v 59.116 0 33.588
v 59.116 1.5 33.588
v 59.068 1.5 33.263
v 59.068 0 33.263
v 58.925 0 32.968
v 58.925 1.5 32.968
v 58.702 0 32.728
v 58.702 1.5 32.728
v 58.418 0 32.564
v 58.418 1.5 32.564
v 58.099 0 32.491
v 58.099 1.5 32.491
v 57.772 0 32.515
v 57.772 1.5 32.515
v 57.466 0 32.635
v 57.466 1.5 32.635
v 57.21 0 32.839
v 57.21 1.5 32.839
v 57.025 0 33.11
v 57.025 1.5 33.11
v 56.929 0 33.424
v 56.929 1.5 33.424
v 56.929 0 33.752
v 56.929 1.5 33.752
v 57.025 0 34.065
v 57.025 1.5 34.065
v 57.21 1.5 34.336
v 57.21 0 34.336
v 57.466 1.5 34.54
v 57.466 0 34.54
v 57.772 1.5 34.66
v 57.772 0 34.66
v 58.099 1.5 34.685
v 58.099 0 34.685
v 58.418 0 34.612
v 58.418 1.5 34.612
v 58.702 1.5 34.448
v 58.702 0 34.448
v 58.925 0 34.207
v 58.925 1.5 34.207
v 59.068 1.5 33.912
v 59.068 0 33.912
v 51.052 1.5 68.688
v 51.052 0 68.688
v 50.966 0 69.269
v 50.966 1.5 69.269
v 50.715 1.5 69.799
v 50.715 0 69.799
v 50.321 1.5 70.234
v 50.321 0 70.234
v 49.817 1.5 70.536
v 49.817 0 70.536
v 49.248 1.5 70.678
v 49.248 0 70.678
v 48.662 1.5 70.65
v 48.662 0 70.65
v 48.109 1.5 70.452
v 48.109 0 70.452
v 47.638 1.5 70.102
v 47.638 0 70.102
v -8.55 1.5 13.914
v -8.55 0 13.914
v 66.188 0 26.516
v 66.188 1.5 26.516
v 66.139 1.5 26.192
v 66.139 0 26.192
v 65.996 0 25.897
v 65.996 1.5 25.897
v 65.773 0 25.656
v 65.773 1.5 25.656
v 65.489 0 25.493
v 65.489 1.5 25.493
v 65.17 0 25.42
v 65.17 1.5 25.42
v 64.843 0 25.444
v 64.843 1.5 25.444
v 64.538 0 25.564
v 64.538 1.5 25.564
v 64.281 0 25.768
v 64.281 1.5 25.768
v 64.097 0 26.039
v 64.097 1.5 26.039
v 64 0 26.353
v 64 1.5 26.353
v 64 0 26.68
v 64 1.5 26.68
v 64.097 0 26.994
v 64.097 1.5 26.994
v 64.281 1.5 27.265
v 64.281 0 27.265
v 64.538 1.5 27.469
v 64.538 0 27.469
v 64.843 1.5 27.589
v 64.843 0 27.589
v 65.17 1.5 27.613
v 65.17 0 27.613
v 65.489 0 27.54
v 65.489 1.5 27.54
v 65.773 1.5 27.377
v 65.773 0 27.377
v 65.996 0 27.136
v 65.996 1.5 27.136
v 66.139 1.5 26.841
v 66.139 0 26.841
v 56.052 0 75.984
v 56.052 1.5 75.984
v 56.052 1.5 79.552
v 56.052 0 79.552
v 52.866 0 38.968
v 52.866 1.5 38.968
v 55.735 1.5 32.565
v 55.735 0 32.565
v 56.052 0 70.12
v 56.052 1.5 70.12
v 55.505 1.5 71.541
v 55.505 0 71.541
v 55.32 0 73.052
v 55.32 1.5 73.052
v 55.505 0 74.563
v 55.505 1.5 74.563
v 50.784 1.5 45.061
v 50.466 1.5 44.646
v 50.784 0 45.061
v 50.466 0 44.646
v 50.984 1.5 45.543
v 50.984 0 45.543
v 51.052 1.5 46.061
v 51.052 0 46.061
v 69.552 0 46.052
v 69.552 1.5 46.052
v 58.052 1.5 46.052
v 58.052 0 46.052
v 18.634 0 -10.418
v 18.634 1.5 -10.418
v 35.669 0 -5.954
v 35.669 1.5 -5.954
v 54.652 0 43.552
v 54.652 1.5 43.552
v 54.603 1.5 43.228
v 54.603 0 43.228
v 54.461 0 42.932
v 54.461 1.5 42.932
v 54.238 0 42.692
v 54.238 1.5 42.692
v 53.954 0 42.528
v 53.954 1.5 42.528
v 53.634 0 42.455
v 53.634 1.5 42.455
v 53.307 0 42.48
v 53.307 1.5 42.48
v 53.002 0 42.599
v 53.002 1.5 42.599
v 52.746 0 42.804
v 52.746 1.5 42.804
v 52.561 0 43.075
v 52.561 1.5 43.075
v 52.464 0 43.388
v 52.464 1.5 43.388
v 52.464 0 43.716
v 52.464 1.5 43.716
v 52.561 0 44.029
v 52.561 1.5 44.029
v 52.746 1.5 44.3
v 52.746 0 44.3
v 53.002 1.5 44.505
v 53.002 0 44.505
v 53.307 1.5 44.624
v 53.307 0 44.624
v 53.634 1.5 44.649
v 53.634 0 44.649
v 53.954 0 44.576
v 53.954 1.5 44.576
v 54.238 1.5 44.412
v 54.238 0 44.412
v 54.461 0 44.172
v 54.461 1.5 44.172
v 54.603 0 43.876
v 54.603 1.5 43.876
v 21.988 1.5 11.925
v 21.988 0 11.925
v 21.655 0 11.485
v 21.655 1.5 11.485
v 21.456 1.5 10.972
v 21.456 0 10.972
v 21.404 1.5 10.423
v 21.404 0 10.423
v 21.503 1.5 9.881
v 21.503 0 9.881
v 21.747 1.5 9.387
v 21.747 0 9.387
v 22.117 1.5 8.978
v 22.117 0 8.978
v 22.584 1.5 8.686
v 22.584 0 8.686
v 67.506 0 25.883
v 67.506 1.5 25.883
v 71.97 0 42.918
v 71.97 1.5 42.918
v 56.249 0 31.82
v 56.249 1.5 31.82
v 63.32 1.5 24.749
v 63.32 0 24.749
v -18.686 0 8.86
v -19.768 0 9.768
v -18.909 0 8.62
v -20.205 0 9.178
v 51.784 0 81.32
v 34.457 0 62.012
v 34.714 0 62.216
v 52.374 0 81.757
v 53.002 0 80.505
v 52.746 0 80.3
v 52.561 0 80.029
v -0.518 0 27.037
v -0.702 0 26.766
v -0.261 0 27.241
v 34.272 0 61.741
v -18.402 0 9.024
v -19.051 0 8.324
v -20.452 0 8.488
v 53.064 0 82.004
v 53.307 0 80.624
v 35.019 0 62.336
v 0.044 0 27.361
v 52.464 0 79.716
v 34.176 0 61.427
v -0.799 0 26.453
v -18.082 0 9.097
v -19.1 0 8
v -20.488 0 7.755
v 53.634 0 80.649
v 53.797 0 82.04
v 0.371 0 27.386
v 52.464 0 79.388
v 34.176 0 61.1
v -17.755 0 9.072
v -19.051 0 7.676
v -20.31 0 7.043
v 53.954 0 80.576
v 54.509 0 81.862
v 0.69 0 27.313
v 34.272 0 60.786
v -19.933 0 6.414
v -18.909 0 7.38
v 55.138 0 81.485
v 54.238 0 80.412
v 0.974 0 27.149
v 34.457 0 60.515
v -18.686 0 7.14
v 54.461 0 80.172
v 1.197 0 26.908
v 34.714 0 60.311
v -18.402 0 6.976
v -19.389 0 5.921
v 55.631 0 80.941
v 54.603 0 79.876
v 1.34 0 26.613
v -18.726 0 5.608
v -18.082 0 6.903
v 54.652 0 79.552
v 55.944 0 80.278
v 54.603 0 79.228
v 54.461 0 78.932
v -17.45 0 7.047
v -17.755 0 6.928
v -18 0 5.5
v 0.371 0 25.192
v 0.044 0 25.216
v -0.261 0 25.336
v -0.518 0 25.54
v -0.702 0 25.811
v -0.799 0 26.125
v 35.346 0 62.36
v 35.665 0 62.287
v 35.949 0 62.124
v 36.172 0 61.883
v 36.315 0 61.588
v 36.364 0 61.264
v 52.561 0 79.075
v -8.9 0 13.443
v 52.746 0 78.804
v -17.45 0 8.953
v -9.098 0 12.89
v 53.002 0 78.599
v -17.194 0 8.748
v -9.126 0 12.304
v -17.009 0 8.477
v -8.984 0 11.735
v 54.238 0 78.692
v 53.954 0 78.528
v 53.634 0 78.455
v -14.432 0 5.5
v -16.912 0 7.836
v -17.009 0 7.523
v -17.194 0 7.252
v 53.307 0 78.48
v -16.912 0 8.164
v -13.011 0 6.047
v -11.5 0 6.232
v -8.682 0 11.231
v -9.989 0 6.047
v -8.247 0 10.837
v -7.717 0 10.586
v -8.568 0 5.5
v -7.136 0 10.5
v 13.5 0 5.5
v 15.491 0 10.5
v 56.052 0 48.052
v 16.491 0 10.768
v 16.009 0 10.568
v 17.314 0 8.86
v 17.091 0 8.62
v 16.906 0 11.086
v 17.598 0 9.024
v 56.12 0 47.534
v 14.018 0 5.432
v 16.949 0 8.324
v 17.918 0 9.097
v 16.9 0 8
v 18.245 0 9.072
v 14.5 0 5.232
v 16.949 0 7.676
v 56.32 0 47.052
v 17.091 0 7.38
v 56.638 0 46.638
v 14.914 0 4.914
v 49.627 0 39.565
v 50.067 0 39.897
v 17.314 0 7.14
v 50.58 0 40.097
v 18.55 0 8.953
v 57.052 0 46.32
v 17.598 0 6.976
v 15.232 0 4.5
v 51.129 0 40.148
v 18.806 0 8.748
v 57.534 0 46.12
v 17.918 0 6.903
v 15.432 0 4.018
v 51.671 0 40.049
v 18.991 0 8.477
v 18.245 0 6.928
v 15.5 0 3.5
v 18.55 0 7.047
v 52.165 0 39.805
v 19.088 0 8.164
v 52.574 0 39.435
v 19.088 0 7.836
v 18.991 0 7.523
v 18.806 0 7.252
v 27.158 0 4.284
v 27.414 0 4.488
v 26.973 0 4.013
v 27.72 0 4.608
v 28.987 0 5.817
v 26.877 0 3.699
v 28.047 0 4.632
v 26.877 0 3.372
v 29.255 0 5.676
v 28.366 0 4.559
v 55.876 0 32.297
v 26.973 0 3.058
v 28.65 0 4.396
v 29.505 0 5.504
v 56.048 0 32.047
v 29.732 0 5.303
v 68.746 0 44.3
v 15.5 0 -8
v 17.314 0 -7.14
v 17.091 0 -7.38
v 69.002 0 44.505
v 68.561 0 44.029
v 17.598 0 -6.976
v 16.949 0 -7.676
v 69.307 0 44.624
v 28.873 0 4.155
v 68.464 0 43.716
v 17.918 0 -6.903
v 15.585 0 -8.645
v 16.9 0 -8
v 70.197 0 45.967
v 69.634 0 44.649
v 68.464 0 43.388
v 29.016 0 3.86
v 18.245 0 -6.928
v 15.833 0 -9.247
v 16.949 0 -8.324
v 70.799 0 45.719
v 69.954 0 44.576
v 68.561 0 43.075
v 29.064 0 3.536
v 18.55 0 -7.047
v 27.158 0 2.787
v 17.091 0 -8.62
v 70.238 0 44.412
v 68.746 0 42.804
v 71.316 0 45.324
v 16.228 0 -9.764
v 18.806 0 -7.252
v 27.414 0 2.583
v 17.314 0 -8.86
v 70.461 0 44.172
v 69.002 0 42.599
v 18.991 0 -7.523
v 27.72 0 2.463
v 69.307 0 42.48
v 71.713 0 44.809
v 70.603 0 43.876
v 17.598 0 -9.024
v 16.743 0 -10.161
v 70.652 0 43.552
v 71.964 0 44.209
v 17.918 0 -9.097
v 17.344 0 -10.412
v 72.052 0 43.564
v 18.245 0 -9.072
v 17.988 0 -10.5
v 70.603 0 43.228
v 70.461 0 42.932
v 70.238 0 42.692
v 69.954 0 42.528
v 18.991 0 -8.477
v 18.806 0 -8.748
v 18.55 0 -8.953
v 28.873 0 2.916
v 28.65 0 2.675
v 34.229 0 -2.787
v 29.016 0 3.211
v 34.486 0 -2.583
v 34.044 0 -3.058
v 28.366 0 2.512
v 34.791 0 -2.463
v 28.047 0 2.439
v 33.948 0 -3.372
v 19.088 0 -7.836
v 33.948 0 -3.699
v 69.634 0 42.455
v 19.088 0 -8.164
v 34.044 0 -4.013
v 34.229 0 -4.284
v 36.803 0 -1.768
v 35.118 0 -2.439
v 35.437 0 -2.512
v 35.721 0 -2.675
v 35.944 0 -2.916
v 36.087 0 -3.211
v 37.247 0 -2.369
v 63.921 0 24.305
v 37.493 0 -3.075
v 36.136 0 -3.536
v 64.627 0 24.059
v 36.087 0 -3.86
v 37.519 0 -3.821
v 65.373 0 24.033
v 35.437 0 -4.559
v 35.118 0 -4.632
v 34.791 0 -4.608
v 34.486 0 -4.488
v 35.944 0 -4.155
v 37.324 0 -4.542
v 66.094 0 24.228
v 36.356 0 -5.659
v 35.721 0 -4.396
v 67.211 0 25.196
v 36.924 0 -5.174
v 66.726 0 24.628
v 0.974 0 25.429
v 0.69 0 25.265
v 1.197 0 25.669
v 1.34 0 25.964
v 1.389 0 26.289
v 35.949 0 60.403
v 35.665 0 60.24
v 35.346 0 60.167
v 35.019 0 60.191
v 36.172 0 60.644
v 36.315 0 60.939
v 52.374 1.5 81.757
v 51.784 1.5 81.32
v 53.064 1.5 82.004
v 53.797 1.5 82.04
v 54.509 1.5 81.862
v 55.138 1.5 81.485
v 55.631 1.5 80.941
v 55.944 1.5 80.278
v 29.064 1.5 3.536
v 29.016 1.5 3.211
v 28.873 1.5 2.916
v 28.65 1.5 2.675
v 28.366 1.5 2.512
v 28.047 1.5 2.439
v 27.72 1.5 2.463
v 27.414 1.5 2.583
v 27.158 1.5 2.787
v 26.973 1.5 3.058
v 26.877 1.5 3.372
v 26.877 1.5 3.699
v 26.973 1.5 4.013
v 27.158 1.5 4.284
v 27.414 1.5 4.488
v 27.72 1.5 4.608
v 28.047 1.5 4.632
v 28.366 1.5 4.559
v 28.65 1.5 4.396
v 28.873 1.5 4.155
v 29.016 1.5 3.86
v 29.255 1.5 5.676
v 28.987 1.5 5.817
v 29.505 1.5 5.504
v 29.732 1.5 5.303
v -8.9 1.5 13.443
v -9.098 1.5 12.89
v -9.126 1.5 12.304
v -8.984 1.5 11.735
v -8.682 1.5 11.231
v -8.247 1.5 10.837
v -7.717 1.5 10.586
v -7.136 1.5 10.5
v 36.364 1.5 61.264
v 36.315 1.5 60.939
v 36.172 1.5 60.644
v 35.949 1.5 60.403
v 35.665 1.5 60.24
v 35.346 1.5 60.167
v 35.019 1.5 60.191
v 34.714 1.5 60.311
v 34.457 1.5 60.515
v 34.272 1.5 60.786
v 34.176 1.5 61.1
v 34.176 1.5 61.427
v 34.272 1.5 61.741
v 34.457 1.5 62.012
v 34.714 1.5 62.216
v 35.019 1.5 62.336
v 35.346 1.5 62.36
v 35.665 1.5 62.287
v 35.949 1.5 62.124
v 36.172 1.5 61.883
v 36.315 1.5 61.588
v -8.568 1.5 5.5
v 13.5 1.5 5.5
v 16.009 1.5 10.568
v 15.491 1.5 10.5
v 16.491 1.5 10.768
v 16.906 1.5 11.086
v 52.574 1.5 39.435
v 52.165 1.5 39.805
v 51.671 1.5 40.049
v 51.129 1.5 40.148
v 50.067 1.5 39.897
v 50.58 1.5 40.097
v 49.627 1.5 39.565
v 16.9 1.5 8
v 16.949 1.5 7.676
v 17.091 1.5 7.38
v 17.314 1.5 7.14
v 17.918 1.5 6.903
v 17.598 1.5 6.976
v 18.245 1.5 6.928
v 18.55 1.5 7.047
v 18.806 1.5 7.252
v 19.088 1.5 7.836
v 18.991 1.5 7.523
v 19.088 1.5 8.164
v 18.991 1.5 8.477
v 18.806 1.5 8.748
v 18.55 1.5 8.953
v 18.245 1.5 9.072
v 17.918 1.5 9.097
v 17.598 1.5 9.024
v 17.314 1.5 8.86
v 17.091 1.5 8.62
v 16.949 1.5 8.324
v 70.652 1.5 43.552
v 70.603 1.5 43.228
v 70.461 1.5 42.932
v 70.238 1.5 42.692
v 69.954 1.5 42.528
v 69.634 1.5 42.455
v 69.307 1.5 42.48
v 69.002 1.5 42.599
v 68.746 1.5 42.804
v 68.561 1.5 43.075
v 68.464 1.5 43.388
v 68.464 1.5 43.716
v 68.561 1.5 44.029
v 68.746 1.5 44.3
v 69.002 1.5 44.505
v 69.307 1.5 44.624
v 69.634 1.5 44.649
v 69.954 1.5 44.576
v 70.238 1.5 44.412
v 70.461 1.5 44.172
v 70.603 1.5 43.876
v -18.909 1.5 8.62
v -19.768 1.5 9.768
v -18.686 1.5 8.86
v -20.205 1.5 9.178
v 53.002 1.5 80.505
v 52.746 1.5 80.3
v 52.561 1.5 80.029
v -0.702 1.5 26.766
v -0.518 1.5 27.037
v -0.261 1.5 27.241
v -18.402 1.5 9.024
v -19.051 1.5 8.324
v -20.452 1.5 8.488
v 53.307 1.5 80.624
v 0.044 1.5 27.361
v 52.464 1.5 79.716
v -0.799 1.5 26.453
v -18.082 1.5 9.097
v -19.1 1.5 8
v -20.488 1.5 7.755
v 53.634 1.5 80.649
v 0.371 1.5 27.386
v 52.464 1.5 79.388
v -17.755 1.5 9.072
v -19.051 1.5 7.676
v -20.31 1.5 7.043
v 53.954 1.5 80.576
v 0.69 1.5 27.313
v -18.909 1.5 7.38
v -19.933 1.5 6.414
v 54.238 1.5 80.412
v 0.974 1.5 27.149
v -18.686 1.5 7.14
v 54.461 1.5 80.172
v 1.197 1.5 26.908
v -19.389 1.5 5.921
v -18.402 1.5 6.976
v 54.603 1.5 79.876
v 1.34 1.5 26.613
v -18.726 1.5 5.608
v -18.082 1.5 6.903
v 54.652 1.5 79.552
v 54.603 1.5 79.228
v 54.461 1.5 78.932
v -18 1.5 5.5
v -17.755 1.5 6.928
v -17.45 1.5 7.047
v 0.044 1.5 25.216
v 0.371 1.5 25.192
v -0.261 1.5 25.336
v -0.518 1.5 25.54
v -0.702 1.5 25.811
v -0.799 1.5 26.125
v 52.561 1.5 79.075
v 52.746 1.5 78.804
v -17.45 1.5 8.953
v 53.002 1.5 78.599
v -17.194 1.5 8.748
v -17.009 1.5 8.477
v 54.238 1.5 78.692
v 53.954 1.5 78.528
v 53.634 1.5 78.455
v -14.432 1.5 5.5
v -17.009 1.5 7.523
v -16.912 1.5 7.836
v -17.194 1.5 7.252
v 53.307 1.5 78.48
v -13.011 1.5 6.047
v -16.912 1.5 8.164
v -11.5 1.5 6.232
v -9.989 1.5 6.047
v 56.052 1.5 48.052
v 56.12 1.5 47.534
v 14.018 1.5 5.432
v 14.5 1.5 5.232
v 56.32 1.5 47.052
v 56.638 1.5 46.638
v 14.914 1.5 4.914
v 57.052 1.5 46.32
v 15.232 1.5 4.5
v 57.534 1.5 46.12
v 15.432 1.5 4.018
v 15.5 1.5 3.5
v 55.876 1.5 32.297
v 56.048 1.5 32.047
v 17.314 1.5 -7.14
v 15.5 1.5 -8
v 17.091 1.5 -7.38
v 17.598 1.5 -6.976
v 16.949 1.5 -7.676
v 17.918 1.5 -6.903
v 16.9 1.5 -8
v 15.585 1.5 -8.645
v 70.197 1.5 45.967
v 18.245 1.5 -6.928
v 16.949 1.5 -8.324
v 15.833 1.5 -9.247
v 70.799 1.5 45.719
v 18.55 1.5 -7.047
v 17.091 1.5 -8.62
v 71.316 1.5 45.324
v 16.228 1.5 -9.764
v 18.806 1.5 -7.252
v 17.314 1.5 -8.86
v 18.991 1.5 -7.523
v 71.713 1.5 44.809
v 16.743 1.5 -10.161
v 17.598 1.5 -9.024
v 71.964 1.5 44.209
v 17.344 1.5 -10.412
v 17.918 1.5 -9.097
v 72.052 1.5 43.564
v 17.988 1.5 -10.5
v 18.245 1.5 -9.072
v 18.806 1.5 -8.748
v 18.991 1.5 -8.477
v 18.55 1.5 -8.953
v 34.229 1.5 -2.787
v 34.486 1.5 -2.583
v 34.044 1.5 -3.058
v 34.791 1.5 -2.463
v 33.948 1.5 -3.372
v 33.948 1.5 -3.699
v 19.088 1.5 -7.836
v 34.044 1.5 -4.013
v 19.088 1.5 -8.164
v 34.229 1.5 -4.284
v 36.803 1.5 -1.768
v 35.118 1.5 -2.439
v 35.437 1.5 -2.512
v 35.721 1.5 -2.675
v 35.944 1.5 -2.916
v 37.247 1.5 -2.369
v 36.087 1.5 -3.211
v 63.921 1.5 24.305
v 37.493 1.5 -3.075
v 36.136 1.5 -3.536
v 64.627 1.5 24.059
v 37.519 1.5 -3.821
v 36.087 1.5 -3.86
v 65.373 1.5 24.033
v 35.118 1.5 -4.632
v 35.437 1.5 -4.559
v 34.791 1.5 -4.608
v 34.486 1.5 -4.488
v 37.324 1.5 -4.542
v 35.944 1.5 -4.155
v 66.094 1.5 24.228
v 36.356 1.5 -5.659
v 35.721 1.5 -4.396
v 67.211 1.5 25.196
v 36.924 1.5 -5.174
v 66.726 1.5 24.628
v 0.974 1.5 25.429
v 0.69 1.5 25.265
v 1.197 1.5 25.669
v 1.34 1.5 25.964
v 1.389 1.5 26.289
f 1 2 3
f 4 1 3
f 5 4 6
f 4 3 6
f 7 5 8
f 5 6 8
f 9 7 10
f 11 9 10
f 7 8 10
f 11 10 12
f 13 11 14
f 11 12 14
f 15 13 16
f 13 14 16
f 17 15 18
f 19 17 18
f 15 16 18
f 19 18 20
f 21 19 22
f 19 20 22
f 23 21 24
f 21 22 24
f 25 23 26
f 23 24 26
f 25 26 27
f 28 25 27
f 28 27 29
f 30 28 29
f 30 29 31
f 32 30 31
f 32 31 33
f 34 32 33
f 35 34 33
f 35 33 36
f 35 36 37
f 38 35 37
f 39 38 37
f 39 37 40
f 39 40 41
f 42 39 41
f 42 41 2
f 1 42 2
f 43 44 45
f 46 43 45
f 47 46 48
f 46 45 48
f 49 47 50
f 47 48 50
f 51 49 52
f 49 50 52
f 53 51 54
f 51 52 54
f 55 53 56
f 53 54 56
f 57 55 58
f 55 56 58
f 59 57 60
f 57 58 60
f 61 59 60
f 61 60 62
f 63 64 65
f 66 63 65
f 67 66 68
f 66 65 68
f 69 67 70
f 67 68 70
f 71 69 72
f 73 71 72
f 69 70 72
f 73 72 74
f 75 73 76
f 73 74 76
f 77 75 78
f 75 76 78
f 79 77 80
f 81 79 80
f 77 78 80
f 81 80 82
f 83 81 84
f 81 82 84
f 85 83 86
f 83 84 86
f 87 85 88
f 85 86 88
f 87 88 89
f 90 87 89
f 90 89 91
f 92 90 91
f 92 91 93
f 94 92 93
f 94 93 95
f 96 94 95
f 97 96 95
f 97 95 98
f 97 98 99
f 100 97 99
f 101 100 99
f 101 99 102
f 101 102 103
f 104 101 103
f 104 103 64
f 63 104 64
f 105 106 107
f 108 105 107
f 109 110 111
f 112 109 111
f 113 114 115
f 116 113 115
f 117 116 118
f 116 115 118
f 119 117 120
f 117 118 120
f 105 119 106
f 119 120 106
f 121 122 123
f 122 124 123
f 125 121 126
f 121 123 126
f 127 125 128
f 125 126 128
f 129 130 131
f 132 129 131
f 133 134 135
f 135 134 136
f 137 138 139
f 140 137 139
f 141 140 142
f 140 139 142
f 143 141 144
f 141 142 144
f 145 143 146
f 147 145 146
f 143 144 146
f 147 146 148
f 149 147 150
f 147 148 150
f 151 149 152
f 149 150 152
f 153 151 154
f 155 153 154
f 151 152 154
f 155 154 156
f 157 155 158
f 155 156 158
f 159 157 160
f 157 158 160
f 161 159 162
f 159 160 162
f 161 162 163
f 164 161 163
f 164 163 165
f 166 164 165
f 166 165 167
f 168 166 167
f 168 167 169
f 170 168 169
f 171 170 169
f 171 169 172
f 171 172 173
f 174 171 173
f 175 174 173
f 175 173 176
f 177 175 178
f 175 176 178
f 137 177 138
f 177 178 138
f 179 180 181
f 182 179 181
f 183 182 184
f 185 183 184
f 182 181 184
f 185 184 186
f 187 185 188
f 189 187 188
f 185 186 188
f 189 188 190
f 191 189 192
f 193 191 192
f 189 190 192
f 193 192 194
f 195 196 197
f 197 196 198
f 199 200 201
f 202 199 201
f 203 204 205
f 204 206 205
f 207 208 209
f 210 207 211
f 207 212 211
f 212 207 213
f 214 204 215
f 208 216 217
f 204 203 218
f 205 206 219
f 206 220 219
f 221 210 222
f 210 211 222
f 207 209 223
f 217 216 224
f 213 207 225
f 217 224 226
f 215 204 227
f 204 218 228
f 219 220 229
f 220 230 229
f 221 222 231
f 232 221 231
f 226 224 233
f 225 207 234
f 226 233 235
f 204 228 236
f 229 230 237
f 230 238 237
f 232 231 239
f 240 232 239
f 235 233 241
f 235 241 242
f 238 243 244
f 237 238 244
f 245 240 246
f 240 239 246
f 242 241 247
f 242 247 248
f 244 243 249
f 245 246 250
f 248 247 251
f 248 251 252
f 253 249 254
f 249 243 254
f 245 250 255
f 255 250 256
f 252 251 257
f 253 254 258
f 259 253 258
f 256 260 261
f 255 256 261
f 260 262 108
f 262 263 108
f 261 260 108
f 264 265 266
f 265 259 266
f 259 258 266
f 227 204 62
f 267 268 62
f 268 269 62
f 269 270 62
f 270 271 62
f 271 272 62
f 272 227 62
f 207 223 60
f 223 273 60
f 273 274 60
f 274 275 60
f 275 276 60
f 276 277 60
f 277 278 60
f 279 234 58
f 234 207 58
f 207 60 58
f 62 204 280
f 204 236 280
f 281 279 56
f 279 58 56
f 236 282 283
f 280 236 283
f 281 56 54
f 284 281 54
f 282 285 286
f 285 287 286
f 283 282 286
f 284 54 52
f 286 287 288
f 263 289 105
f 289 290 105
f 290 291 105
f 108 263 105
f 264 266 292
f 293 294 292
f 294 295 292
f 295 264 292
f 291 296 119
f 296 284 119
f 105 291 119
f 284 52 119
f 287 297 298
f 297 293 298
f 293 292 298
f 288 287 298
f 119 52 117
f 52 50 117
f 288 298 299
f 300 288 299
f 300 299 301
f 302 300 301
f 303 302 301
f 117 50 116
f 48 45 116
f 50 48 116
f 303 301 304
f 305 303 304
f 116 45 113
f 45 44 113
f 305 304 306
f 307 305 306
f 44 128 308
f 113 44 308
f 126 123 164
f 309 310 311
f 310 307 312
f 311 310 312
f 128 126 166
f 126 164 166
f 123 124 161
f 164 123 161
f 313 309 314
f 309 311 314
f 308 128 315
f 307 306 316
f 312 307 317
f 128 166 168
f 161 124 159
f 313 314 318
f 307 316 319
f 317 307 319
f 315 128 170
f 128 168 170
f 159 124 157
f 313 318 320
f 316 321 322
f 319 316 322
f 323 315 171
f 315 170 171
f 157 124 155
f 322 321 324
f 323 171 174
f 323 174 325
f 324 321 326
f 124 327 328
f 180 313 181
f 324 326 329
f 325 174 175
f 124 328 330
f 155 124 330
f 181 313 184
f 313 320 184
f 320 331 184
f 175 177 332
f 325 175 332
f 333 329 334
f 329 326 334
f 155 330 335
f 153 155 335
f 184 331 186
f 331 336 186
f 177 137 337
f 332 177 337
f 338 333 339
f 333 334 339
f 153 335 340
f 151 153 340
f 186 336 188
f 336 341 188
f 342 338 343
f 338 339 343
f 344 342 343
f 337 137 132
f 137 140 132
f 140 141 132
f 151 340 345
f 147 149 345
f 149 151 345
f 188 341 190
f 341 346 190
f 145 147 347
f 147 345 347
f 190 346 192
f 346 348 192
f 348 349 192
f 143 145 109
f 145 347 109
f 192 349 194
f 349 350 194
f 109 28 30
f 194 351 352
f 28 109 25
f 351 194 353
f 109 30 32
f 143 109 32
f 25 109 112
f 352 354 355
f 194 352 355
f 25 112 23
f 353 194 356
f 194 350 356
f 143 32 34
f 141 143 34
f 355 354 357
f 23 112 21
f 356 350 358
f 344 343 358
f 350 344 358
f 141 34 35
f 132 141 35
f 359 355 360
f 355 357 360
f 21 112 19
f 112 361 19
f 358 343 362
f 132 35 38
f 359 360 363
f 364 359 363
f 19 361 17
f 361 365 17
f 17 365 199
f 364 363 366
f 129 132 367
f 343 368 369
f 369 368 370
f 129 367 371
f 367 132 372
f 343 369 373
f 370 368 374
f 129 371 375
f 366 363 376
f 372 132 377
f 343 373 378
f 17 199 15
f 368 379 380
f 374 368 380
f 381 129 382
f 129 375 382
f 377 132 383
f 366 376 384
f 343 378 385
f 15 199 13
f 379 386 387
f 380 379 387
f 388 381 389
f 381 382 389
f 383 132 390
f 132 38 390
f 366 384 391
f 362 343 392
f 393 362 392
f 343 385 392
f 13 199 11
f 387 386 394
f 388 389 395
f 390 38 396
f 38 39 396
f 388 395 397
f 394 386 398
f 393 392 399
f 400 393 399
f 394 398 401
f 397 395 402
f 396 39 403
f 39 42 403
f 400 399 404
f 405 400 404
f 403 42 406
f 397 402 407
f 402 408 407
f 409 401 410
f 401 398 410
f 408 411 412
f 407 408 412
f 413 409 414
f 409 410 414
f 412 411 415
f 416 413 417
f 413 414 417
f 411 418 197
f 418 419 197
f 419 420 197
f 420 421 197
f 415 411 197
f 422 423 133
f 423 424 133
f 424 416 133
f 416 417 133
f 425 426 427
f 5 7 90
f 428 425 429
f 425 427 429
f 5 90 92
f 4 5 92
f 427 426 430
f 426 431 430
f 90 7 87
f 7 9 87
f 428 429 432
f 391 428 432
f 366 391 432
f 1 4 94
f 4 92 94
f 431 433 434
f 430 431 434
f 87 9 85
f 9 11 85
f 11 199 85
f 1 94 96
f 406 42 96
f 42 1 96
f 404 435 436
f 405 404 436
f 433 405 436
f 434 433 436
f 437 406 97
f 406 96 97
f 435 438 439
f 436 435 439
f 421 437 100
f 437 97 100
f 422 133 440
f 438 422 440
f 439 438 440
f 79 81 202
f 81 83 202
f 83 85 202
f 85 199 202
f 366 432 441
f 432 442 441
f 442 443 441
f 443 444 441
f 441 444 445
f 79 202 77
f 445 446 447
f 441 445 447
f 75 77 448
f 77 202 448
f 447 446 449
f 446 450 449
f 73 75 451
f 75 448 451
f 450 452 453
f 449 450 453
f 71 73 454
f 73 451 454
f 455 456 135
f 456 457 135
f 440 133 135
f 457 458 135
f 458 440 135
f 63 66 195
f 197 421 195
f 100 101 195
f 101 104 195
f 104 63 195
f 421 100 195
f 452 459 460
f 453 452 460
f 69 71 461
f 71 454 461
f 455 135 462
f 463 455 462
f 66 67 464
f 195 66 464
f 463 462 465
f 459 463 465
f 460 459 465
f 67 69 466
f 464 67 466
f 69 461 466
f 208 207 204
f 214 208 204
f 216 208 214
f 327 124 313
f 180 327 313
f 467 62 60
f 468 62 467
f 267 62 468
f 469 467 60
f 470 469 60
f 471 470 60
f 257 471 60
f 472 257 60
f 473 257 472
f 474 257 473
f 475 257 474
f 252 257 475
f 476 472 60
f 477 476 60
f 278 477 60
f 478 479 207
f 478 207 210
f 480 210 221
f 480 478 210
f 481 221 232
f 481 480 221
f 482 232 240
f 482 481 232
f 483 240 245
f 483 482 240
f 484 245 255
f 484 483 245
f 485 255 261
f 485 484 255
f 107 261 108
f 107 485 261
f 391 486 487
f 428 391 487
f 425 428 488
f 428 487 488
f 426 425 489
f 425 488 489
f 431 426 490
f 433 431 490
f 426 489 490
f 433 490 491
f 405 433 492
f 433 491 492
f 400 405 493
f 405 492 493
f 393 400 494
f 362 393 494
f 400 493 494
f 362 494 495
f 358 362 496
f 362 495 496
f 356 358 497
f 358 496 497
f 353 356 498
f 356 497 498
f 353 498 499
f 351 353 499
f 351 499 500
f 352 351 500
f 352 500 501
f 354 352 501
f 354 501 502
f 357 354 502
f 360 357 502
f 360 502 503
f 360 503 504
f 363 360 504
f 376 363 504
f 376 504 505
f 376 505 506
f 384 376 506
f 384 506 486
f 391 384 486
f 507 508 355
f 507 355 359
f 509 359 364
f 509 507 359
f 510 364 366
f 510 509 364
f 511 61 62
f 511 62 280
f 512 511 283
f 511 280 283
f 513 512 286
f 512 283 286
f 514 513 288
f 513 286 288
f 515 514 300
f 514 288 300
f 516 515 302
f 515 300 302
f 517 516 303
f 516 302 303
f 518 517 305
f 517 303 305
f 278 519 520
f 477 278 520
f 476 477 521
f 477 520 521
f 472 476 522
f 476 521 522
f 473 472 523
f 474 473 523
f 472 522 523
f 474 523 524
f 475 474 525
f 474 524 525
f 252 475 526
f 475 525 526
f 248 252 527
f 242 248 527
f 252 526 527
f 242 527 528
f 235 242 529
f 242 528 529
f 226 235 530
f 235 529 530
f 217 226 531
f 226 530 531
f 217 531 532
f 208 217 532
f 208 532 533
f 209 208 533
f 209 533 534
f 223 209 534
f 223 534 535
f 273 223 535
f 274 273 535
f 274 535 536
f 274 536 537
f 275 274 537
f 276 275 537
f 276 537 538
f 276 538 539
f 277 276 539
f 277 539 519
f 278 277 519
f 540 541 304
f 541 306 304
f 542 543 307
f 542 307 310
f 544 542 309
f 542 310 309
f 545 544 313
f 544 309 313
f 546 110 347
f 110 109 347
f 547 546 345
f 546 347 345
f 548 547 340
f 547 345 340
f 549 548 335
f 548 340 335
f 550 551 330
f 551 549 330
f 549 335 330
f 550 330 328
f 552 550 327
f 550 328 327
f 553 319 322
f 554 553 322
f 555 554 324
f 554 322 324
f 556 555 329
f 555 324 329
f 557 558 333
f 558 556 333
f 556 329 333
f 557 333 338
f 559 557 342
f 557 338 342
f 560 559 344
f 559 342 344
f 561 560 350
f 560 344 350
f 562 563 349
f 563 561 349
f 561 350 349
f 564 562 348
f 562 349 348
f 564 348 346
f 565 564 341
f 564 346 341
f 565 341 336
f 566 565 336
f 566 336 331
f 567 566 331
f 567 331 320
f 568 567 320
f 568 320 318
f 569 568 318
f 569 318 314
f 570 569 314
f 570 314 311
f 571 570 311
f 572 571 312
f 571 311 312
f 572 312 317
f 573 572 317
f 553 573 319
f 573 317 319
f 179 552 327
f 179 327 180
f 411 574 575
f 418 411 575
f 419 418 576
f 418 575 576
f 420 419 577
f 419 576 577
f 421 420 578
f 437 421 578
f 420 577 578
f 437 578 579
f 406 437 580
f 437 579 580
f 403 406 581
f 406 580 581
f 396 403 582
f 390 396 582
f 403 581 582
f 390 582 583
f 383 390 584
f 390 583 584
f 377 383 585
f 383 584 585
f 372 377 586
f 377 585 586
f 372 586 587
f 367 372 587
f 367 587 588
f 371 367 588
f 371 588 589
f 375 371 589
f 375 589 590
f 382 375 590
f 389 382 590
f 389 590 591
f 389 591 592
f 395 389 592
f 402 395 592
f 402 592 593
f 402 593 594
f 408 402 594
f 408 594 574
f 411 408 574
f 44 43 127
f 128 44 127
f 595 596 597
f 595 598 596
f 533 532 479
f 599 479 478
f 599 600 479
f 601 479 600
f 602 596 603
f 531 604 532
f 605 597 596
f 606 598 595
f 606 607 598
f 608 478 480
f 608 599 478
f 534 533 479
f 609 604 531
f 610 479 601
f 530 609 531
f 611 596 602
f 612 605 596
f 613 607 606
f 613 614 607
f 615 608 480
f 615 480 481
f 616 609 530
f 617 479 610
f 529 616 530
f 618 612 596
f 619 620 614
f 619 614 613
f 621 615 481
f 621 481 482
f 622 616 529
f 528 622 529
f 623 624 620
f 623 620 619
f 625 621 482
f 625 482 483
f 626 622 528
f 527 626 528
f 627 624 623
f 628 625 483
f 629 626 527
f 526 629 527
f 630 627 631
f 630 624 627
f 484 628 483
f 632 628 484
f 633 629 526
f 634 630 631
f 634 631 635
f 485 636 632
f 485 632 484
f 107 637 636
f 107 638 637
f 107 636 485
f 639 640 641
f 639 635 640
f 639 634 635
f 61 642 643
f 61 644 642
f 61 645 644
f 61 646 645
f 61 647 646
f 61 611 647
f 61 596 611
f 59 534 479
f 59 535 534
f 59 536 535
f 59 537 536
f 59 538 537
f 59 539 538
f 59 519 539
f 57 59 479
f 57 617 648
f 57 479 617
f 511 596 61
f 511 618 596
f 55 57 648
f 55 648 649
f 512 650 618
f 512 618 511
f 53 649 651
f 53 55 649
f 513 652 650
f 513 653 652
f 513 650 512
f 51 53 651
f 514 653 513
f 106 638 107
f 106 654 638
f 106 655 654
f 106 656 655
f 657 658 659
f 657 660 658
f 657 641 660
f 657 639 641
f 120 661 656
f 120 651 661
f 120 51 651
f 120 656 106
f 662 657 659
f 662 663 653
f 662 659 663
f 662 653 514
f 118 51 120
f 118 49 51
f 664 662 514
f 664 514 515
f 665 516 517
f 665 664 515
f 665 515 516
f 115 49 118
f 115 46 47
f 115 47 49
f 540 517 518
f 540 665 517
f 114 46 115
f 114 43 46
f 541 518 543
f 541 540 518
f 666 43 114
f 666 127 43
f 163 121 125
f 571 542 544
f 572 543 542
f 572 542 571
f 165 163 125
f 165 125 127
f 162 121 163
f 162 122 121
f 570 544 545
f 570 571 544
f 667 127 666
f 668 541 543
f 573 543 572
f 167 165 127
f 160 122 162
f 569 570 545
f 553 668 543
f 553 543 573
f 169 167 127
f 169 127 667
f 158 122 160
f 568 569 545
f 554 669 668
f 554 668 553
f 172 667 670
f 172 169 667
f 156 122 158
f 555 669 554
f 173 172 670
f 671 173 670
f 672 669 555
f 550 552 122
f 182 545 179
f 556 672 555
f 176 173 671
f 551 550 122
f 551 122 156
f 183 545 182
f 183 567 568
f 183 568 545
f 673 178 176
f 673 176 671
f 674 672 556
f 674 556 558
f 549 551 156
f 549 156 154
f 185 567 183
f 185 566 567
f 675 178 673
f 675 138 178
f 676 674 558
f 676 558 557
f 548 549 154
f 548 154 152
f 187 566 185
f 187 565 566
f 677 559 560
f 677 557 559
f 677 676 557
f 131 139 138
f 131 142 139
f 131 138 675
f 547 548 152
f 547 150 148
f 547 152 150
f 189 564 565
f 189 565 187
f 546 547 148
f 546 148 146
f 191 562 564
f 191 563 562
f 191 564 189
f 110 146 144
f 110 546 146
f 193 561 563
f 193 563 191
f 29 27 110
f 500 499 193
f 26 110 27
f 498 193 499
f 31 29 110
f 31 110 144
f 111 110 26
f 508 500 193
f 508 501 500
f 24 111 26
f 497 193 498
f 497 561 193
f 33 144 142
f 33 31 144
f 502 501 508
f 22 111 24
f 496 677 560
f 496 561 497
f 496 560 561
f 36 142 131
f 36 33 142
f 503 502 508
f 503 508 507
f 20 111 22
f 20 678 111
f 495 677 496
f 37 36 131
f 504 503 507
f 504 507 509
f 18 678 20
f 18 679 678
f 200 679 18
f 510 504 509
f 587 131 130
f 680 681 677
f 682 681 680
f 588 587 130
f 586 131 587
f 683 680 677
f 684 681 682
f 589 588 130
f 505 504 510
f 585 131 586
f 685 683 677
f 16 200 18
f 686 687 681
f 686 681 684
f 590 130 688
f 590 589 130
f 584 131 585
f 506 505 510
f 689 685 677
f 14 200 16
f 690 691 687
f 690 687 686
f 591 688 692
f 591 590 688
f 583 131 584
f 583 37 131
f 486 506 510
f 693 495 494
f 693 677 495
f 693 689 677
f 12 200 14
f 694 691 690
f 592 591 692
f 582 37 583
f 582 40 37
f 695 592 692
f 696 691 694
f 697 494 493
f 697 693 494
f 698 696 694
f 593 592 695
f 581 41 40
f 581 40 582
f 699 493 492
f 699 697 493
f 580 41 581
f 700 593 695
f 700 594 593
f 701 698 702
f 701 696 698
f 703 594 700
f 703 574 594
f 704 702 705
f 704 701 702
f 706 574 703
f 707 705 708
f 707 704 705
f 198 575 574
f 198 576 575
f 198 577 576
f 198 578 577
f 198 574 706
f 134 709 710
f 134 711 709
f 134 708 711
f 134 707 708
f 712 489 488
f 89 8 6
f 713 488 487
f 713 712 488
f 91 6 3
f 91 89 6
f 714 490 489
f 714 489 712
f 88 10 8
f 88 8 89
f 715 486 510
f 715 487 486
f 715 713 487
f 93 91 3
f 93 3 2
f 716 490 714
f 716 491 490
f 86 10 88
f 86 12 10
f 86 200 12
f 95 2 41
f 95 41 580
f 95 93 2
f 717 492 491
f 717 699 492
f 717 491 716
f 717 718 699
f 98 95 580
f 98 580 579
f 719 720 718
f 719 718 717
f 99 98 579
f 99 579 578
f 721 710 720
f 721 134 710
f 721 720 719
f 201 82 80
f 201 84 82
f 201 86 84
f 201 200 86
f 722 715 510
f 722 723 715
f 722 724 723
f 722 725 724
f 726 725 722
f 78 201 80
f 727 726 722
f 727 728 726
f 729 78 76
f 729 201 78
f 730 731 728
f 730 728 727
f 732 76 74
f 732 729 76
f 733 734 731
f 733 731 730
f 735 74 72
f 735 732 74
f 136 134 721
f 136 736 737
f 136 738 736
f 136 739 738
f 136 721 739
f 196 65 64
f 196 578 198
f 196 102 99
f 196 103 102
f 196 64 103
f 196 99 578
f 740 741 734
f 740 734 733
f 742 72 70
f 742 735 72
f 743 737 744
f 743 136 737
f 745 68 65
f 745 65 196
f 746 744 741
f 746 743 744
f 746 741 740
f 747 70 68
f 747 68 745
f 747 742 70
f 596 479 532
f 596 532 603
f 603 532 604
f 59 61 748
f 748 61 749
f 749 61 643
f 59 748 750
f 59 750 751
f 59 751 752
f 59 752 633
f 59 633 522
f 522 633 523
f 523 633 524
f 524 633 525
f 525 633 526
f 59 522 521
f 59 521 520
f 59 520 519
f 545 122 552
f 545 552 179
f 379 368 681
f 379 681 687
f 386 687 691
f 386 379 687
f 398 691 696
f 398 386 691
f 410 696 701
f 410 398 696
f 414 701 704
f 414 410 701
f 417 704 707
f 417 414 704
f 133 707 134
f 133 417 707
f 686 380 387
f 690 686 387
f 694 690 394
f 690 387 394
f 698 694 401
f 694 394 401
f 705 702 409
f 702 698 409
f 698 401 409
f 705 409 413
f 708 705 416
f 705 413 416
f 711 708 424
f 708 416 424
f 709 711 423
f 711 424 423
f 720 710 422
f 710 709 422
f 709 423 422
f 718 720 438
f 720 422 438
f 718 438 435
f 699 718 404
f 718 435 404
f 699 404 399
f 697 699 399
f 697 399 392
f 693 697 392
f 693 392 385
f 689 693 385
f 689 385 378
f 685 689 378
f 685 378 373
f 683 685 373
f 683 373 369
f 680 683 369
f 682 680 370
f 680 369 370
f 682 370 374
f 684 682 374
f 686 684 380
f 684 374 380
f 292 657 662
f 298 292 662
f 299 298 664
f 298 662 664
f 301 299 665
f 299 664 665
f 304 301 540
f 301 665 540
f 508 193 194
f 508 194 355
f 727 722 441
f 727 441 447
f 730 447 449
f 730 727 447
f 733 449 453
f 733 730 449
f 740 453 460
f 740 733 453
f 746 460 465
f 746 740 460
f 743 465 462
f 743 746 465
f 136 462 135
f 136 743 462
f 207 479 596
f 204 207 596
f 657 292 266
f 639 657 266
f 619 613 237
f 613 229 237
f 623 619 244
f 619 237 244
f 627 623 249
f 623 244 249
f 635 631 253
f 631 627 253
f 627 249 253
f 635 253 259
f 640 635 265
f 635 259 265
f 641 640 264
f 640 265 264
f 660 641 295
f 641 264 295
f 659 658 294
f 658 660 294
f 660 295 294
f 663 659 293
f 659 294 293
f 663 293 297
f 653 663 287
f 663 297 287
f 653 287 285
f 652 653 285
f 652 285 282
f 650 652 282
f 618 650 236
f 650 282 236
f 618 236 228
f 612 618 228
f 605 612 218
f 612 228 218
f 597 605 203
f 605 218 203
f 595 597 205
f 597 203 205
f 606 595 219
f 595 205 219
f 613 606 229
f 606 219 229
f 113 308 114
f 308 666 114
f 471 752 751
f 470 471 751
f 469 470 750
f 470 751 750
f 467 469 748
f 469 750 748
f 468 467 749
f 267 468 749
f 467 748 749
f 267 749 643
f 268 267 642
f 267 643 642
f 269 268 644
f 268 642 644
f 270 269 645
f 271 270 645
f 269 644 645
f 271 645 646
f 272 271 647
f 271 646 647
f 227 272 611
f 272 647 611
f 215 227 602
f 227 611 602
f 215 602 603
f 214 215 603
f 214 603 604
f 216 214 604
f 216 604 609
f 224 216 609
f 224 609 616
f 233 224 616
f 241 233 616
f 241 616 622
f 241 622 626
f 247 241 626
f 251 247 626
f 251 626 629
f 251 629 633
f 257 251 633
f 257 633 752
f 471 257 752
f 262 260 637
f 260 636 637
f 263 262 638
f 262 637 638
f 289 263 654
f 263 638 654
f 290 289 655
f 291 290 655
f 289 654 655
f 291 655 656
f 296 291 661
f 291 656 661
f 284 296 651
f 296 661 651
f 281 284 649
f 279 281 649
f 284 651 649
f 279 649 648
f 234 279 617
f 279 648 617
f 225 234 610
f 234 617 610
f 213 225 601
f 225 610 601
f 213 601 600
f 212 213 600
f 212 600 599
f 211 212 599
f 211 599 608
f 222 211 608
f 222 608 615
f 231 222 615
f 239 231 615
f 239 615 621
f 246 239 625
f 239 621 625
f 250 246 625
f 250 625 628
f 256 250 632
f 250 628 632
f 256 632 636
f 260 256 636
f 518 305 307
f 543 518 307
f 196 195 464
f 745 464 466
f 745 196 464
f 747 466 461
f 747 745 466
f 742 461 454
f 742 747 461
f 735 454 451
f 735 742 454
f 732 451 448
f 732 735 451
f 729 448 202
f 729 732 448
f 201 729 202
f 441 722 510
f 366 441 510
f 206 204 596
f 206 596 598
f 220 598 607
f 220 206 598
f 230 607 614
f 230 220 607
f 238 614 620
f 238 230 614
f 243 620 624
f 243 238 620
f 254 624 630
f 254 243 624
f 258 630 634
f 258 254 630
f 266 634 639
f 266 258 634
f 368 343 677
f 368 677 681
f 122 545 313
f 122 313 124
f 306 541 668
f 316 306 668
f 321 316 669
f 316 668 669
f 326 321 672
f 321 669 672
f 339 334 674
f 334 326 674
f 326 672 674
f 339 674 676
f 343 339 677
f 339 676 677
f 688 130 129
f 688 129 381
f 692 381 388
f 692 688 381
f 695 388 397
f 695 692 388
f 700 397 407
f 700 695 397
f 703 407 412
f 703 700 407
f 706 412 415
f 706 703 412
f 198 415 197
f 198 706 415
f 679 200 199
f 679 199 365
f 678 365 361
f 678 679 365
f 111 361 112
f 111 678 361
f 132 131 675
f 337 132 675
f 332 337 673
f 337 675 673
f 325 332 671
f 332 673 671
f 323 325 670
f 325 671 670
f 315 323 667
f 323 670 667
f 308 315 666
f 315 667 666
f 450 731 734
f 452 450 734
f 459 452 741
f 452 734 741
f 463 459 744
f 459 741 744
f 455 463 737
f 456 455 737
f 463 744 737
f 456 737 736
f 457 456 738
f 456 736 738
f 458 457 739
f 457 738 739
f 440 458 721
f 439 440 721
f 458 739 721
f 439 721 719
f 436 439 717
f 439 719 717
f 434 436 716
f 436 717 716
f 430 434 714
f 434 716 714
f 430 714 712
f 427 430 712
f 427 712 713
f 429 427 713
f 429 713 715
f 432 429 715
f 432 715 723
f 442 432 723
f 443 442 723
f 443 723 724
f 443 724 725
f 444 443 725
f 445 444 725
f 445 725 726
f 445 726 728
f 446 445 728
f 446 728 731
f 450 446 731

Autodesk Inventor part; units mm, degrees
ref_plane "YZ Plane" through (0, 0, 0) normal (1, 0, 0) x (0, 1, 0)
ref_plane "XZ Plane" through (0, 0, 0) normal (0, 1, 0) x (-1, 0, 0)
sketch "スケッチ1" plane through (0, 0, 0) normal (0, 1, 0) x (-1, 0, 0)
  line L0 (18, 8) -> (-18, 8) construction
  line L1 (-18, 8) -> (-18, -8) construction
  line L2 (-18, -8) -> (18, -8) construction
  line L3 (18, -8) -> (18, 8) construction
  line L4 (18, 8) -> (-18, -8) construction
  line L5 (-18, 8) -> (18, -8) construction
  circle A0 centre (18, -8) radius 1.1
  circle A1 centre (-18, -8) radius 1.1
  circle A2 centre (-18, 8) radius 1.1
  circle A3 centre (18, -8) radius 2.5
  circle A4 centre (-18, -8) radius 2.5
  circle A5 centre (-18, 8) radius 2.5
  line L6 (18, -10.5) -> (-18, -10.5)
  line L7 (-15.5, 8) -> (-15.5, -8)
  line L8 (-18, -5.5) -> (18, -5.5)
  line L9 (-20.5, -8) -> (-20.5, 8)
  line L10 (-20.5, 0) -> (18, 0) construction
  circle A6 centre (18, 8) radius 1.1
  circle A7 centre (18, 8) radius 2.5
  line L11 (18, 10.5) -> (-18, 10.5)
  line L12 (-18, 5.5) -> (18, 5.5)
  point P0 (0, 0)
  point P1 (-17.0032, -10.2927)
  point P2 (-17.0032, 10.2927)
  point P3 (-15.5, -5.5)
  point P4 (18.123, -10.497)
  point P5 (-15.5, 5.5)
  dimension "d0" = 36
  dimension "d2" = 2.2
  dimension "d3" = 2.2
  dimension "d5" = 5
  dimension "d17" = 16
extrude "押し出し1" add sketch "スケッチ1" along normal blind 1.5 contours L8 A4 L9 A5 L12 L7 | L7 A4 L8 | A4 | L12 A5 L7 | L7 A5 L11 A7 L12 | A5 | A7
fillet "フィレット1" radius 2 1 edges at (15.5, 0.75, 5.5)
sketch "スケッチ2" plane through (0, 1.5, 0) normal (0, 1, 0) x (1, 0, 0)
  line L0 (39.5, 8) -> (23.5, -8) construction
  line L1 (20.5, -8) -> (20.5, 8) projected
  circle A0 centre (35.0355, 3.5355) radius 1.1
  circle A1 centre (27.9645, -3.5355) radius 1.1
  line L2 (31.5, 0) -> (34.6629, -3.1629) construction
  circle A2 centre (27.9645, -3.5355) radius 2.5
  circle A3 centre (35.0355, 3.5355) radius 2.5
  line L3 (15.5, 8) -> (15.5, -3.5) projected
  arc A4 (18, -10.5) -> (20.5, -8) centre (18, -8) ccw projected
  line L4 (20.5, -8) -> (20.5, 8) projected
  arc A5 (20.5, 8) -> (15.5, 8) centre (18, 8) ccw projected
  circle A6 centre (18, 8) radius 1.1 projected
  circle A7 centre (18, -8) radius 1.1 projected
  line L5 (18.6338, 10.4183) -> (35.6693, 5.9539)
  line L6 (19.0222, -10.2815) -> (28.9867, -5.817)
  line L7 (36.8033, 1.7678) -> (29.7322, -5.3033)
  line L8 (13.5, -5.5) -> (-18, -5.5) projected
  arc A8 (-18, -5.5) -> (-18, -10.5) centre (-18, -8) ccw projected
  line L9 (-18, -10.5) -> (18, -10.5) projected
  arc A9 (13.5, -5.5) -> (15.5, -3.5) centre (13.5, -3.5) ccw projected
  point P0 (0, 0)
  dimension "d18" = 45
  dimension "d19" = 3
  dimension "d20" = 2.2
  dimension "d21" = 2.2
  dimension "d22" = 5
  dimension "d23" = 5
  dimension "d24" = 5
  dimension "d25" = 5
extrude "押し出し2" add sketch "スケッチ2" against normal up to surface (1.5 mm away) contours L1 A5 L5 A3 L7 A2 L6 A4 | A2 | A3
ref_plane "作業平面1" through (31.0675, 0, 31.152) normal (0, 1, 0) x (0, 0, 1)
sketch "スケッチ3" plane through (0, 1.5, 0) normal (0, 1, 0) x (1, 0, 0)
  line L0 (36.8033, 5.3033) -> (66.8553, -24.7487) projected
  line L1 (52.1378, -80.9663) -> (-19.4142, -9.4142) projected
  line L2 (51.8293, -9.7227) -> (16.3618, -45.1902) construction
  circle A0 centre (35.0355, 3.5355) radius 1.1 projected
  circle A1 centre (27.9645, -3.5355) radius 1.1 projected
  arc A2 (18, -10.5) -> (19.0222, -10.2815) centre (18, -8) ccw projected
  line L3 (19.0222, -10.2815) -> (28.9867, -5.817) projected
  arc A3 (28.9867, -5.817) -> (29.7322, -5.3033) centre (27.9645, -3.5355) ccw projected
  line L4 (29.7322, -5.3033) -> (36.8033, 1.7678) projected
  arc A4 (36.8033, 1.7678) -> (35.6693, 5.9539) centre (35.0355, 3.5355) ccw projected
  line L5 (35.6693, 5.9539) -> (18.6338, 10.4183) projected
  arc A5 (18.6338, 10.4183) -> (15.5, 8) centre (18, 8) ccw projected
  line L6 (15.5, 8) -> (15.5, -3.5) projected
  arc A6 (13.5, -5.5) -> (15.5, -3.5) centre (13.5, -3.5) ccw projected
  line L7 (13.5, -5.5) -> (-18, -5.5) projected
  arc A7 (-18, -5.5) -> (-18, -10.5) centre (-18, -8) ccw projected
  line L8 (-18, -10.5) -> (18, -10.5) projected
  circle A8 centre (18, -8) radius 1.1 projected
  circle A9 centre (-18, -8) radius 1.1 projected
  circle A10 centre (18, 8) radius 1.1 projected
  line L9 (66.8553, -24.7487) -> (36.8033, 5.3033)
  line L10 (-19.4142, -9.4142) -> (52.1378, -80.9663)
  circle A11 centre (65.0876, -26.5165) radius 1.1
  circle A12 centre (58.0165, -33.5876) radius 1.1
  arc A13 (51.2706, -42.5298) -> (51.052, -43.552) centre (53.552, -43.552) ccw
  line L11 (51.2706, -42.5298) -> (55.735, -32.5654)
  arc A14 (56.2487, -31.8198) -> (55.735, -32.5654) centre (58.0165, -33.5876) ccw
  line L12 (56.2487, -31.8198) -> (63.3198, -24.7487)
  arc A15 (67.5059, -25.8827) -> (63.3198, -24.7487) centre (65.0876, -26.5165) ccw
  line L13 (67.5059, -25.8827) -> (71.9704, -42.9183)
  arc A16 (69.552, -46.052) -> (71.9704, -42.9183) centre (69.552, -43.552) ccw
  line L14 (69.552, -46.052) -> (58.052, -46.052)
  arc A17 (58.052, -46.052) -> (56.052, -48.052) centre (58.052, -48.052) ccw
  line L15 (56.052, -48.052) -> (56.052, -79.552)
  arc A18 (51.052, -79.552) -> (56.052, -79.552) centre (53.552, -79.552) ccw
  line L16 (51.052, -79.552) -> (51.052, -43.552)
  circle A19 centre (53.552, -43.552) radius 1.1
  circle A20 centre (53.552, -79.552) radius 1.1
  circle A21 centre (69.552, -43.552) radius 1.1
  point P0 (0, 0)
  point P1 (61.552, -61.552)
extrude "押し出し3" add sketch "スケッチ3" against normal up to surface (1.5 mm away) contours A15 L13 A16 L14 A17 L15 A18 L16 A13 L11 A14 L12
sketch "スケッチ4" plane through (0, 1.5, 0) normal (0, 1, 0) x (1, 0, 0)
  arc A0 (51.052, -79.552) -> (56.052, -79.552) centre (53.552, -79.552) ccw projected
  line L0 (51.7843, -81.3198) -> (-19.7678, -9.7678)
  arc A1 (-18, -5.5) -> (-18, -10.5) centre (-18, -8) ccw projected
  arc A2 (-18, -5.5) -> (-18, -10.5) centre (-18, -8) ccw projected
  arc A3 (51.052, -79.552) -> (56.052, -79.552) centre (53.552, -79.552) ccw projected
  circle A4 centre (53.552, -79.552) radius 2.5
  line L1 (55.3198, -77.7843) -> (-16.9645, -5.5)
  line L2 (51.052, -43.552) -> (51.052, -79.552) projected
  line L3 (-18, -10.5) -> (18, -10.5) projected
  line L4 (13.5, -5.5) -> (-18, -5.5) projected
  point P0 (0, 0)
  point P1 (-11.9645, -10.5)
  point P2 (51.052, -73.5165)
extrude "押し出し5" add sketch "スケッチ4" against normal up to surface (1.5 mm away) contours A0 L0 A1 L3 L1 L2
fillet "フィレット2" radius 2 2 edges at (51.052, 0.75, 73.5165) (-11.9645, 0.75, 10.5)
sketch "スケッチ5" plane through (0, 1.5, 0) normal (0, 1, 0) x (1, 0, 0)
  circle A0 centre (-11.5, 0) radius 6.2325 projected
  circle A1 centre (61.552, -73.052) radius 6.2325 projected
  point P0 (0, 0)
extrude "押し出し6" cut sketch "スケッチ5" against normal through all
sketch "スケッチ6" plane through (0, 1.5, 0) normal (0, 1, 0) x (1, 0, 0)
  line L0 (-7.136, -10.5) -> (18, -10.5) projected
  line L1 (16.3198, -10.5) -> (51.052, -45.2322)
  line L2 (51.052, -68.6881) -> (51.052, -43.552) projected
  line L3 (51.2706, -42.5298) -> (55.735, -32.5654) projected
  line L4 (51.6795, -41.6171) -> (19.935, -9.8725)
  line L5 (28.9867, -5.817) -> (19.0222, -10.2815) projected
  line L6 (47.6378, -70.1023) -> (-8.5503, -13.9142) projected
  arc A0 (18, -10.5) -> (19.0222, -10.2815) centre (18, -8) ccw projected
  arc A1 (51.2706, -42.5298) -> (51.052, -43.552) centre (53.552, -43.552) ccw projected
  point P0 (0, 0)
  dimension "d37" = 3
  dimension "d38" = 20
extrude "押し出し7" add sketch "スケッチ6" against normal up to surface (1.5 mm away)
fillet "フィレット3" radius 2 4 edges at (16.3198, 0.75, 10.5) (19.935, 0.75, 9.8725) (51.052, 0.75, 45.2322) (51.6795, 0.75, 41.6171)
sketch "スケッチ7" plane through (0, 1.5, 0) normal (0, 1, 0) x (1, 0, 0)
  arc A0 (-7.136, -10.5) -> (-8.5503, -13.9142) centre (-7.136, -12.5) ccw construction
  line L0 (-8.5503, -13.9142) -> (-12.0858, -17.4497) construction
  line L1 (-19.7678, -9.7678) -> (51.7843, -81.3198) construction
  line L2 (-10.318, -15.682) -> (45.8701, -71.8701) construction
  arc A1 (47.6378, -70.1023) -> (51.052, -68.6881) centre (49.052, -68.6881) ccw construction
  line L3 (47.6378, -70.1023) -> (44.1023, -73.6378) construction
  circle A2 centre (0.2886, -26.2886) radius 1.1
  line L4 (47.6378, -70.1023) -> (-8.5503, -13.9142) projected
  line L5 (17.776, -43.776) -> (16.0083, -45.5438) construction
  circle A3 centre (35.2635, -61.2635) radius 1.1
  point P0 (0, 0)
  dimension "d42" = 2.2
  dimension "d43" = 15
extrude "押し出し8" cut sketch "スケッチ7" against normal through all
equation "\"d23\" = d22"
equation "\"d24\" = d25"
equation "\"d26\" = d22"
properties part number "piti_mata"
